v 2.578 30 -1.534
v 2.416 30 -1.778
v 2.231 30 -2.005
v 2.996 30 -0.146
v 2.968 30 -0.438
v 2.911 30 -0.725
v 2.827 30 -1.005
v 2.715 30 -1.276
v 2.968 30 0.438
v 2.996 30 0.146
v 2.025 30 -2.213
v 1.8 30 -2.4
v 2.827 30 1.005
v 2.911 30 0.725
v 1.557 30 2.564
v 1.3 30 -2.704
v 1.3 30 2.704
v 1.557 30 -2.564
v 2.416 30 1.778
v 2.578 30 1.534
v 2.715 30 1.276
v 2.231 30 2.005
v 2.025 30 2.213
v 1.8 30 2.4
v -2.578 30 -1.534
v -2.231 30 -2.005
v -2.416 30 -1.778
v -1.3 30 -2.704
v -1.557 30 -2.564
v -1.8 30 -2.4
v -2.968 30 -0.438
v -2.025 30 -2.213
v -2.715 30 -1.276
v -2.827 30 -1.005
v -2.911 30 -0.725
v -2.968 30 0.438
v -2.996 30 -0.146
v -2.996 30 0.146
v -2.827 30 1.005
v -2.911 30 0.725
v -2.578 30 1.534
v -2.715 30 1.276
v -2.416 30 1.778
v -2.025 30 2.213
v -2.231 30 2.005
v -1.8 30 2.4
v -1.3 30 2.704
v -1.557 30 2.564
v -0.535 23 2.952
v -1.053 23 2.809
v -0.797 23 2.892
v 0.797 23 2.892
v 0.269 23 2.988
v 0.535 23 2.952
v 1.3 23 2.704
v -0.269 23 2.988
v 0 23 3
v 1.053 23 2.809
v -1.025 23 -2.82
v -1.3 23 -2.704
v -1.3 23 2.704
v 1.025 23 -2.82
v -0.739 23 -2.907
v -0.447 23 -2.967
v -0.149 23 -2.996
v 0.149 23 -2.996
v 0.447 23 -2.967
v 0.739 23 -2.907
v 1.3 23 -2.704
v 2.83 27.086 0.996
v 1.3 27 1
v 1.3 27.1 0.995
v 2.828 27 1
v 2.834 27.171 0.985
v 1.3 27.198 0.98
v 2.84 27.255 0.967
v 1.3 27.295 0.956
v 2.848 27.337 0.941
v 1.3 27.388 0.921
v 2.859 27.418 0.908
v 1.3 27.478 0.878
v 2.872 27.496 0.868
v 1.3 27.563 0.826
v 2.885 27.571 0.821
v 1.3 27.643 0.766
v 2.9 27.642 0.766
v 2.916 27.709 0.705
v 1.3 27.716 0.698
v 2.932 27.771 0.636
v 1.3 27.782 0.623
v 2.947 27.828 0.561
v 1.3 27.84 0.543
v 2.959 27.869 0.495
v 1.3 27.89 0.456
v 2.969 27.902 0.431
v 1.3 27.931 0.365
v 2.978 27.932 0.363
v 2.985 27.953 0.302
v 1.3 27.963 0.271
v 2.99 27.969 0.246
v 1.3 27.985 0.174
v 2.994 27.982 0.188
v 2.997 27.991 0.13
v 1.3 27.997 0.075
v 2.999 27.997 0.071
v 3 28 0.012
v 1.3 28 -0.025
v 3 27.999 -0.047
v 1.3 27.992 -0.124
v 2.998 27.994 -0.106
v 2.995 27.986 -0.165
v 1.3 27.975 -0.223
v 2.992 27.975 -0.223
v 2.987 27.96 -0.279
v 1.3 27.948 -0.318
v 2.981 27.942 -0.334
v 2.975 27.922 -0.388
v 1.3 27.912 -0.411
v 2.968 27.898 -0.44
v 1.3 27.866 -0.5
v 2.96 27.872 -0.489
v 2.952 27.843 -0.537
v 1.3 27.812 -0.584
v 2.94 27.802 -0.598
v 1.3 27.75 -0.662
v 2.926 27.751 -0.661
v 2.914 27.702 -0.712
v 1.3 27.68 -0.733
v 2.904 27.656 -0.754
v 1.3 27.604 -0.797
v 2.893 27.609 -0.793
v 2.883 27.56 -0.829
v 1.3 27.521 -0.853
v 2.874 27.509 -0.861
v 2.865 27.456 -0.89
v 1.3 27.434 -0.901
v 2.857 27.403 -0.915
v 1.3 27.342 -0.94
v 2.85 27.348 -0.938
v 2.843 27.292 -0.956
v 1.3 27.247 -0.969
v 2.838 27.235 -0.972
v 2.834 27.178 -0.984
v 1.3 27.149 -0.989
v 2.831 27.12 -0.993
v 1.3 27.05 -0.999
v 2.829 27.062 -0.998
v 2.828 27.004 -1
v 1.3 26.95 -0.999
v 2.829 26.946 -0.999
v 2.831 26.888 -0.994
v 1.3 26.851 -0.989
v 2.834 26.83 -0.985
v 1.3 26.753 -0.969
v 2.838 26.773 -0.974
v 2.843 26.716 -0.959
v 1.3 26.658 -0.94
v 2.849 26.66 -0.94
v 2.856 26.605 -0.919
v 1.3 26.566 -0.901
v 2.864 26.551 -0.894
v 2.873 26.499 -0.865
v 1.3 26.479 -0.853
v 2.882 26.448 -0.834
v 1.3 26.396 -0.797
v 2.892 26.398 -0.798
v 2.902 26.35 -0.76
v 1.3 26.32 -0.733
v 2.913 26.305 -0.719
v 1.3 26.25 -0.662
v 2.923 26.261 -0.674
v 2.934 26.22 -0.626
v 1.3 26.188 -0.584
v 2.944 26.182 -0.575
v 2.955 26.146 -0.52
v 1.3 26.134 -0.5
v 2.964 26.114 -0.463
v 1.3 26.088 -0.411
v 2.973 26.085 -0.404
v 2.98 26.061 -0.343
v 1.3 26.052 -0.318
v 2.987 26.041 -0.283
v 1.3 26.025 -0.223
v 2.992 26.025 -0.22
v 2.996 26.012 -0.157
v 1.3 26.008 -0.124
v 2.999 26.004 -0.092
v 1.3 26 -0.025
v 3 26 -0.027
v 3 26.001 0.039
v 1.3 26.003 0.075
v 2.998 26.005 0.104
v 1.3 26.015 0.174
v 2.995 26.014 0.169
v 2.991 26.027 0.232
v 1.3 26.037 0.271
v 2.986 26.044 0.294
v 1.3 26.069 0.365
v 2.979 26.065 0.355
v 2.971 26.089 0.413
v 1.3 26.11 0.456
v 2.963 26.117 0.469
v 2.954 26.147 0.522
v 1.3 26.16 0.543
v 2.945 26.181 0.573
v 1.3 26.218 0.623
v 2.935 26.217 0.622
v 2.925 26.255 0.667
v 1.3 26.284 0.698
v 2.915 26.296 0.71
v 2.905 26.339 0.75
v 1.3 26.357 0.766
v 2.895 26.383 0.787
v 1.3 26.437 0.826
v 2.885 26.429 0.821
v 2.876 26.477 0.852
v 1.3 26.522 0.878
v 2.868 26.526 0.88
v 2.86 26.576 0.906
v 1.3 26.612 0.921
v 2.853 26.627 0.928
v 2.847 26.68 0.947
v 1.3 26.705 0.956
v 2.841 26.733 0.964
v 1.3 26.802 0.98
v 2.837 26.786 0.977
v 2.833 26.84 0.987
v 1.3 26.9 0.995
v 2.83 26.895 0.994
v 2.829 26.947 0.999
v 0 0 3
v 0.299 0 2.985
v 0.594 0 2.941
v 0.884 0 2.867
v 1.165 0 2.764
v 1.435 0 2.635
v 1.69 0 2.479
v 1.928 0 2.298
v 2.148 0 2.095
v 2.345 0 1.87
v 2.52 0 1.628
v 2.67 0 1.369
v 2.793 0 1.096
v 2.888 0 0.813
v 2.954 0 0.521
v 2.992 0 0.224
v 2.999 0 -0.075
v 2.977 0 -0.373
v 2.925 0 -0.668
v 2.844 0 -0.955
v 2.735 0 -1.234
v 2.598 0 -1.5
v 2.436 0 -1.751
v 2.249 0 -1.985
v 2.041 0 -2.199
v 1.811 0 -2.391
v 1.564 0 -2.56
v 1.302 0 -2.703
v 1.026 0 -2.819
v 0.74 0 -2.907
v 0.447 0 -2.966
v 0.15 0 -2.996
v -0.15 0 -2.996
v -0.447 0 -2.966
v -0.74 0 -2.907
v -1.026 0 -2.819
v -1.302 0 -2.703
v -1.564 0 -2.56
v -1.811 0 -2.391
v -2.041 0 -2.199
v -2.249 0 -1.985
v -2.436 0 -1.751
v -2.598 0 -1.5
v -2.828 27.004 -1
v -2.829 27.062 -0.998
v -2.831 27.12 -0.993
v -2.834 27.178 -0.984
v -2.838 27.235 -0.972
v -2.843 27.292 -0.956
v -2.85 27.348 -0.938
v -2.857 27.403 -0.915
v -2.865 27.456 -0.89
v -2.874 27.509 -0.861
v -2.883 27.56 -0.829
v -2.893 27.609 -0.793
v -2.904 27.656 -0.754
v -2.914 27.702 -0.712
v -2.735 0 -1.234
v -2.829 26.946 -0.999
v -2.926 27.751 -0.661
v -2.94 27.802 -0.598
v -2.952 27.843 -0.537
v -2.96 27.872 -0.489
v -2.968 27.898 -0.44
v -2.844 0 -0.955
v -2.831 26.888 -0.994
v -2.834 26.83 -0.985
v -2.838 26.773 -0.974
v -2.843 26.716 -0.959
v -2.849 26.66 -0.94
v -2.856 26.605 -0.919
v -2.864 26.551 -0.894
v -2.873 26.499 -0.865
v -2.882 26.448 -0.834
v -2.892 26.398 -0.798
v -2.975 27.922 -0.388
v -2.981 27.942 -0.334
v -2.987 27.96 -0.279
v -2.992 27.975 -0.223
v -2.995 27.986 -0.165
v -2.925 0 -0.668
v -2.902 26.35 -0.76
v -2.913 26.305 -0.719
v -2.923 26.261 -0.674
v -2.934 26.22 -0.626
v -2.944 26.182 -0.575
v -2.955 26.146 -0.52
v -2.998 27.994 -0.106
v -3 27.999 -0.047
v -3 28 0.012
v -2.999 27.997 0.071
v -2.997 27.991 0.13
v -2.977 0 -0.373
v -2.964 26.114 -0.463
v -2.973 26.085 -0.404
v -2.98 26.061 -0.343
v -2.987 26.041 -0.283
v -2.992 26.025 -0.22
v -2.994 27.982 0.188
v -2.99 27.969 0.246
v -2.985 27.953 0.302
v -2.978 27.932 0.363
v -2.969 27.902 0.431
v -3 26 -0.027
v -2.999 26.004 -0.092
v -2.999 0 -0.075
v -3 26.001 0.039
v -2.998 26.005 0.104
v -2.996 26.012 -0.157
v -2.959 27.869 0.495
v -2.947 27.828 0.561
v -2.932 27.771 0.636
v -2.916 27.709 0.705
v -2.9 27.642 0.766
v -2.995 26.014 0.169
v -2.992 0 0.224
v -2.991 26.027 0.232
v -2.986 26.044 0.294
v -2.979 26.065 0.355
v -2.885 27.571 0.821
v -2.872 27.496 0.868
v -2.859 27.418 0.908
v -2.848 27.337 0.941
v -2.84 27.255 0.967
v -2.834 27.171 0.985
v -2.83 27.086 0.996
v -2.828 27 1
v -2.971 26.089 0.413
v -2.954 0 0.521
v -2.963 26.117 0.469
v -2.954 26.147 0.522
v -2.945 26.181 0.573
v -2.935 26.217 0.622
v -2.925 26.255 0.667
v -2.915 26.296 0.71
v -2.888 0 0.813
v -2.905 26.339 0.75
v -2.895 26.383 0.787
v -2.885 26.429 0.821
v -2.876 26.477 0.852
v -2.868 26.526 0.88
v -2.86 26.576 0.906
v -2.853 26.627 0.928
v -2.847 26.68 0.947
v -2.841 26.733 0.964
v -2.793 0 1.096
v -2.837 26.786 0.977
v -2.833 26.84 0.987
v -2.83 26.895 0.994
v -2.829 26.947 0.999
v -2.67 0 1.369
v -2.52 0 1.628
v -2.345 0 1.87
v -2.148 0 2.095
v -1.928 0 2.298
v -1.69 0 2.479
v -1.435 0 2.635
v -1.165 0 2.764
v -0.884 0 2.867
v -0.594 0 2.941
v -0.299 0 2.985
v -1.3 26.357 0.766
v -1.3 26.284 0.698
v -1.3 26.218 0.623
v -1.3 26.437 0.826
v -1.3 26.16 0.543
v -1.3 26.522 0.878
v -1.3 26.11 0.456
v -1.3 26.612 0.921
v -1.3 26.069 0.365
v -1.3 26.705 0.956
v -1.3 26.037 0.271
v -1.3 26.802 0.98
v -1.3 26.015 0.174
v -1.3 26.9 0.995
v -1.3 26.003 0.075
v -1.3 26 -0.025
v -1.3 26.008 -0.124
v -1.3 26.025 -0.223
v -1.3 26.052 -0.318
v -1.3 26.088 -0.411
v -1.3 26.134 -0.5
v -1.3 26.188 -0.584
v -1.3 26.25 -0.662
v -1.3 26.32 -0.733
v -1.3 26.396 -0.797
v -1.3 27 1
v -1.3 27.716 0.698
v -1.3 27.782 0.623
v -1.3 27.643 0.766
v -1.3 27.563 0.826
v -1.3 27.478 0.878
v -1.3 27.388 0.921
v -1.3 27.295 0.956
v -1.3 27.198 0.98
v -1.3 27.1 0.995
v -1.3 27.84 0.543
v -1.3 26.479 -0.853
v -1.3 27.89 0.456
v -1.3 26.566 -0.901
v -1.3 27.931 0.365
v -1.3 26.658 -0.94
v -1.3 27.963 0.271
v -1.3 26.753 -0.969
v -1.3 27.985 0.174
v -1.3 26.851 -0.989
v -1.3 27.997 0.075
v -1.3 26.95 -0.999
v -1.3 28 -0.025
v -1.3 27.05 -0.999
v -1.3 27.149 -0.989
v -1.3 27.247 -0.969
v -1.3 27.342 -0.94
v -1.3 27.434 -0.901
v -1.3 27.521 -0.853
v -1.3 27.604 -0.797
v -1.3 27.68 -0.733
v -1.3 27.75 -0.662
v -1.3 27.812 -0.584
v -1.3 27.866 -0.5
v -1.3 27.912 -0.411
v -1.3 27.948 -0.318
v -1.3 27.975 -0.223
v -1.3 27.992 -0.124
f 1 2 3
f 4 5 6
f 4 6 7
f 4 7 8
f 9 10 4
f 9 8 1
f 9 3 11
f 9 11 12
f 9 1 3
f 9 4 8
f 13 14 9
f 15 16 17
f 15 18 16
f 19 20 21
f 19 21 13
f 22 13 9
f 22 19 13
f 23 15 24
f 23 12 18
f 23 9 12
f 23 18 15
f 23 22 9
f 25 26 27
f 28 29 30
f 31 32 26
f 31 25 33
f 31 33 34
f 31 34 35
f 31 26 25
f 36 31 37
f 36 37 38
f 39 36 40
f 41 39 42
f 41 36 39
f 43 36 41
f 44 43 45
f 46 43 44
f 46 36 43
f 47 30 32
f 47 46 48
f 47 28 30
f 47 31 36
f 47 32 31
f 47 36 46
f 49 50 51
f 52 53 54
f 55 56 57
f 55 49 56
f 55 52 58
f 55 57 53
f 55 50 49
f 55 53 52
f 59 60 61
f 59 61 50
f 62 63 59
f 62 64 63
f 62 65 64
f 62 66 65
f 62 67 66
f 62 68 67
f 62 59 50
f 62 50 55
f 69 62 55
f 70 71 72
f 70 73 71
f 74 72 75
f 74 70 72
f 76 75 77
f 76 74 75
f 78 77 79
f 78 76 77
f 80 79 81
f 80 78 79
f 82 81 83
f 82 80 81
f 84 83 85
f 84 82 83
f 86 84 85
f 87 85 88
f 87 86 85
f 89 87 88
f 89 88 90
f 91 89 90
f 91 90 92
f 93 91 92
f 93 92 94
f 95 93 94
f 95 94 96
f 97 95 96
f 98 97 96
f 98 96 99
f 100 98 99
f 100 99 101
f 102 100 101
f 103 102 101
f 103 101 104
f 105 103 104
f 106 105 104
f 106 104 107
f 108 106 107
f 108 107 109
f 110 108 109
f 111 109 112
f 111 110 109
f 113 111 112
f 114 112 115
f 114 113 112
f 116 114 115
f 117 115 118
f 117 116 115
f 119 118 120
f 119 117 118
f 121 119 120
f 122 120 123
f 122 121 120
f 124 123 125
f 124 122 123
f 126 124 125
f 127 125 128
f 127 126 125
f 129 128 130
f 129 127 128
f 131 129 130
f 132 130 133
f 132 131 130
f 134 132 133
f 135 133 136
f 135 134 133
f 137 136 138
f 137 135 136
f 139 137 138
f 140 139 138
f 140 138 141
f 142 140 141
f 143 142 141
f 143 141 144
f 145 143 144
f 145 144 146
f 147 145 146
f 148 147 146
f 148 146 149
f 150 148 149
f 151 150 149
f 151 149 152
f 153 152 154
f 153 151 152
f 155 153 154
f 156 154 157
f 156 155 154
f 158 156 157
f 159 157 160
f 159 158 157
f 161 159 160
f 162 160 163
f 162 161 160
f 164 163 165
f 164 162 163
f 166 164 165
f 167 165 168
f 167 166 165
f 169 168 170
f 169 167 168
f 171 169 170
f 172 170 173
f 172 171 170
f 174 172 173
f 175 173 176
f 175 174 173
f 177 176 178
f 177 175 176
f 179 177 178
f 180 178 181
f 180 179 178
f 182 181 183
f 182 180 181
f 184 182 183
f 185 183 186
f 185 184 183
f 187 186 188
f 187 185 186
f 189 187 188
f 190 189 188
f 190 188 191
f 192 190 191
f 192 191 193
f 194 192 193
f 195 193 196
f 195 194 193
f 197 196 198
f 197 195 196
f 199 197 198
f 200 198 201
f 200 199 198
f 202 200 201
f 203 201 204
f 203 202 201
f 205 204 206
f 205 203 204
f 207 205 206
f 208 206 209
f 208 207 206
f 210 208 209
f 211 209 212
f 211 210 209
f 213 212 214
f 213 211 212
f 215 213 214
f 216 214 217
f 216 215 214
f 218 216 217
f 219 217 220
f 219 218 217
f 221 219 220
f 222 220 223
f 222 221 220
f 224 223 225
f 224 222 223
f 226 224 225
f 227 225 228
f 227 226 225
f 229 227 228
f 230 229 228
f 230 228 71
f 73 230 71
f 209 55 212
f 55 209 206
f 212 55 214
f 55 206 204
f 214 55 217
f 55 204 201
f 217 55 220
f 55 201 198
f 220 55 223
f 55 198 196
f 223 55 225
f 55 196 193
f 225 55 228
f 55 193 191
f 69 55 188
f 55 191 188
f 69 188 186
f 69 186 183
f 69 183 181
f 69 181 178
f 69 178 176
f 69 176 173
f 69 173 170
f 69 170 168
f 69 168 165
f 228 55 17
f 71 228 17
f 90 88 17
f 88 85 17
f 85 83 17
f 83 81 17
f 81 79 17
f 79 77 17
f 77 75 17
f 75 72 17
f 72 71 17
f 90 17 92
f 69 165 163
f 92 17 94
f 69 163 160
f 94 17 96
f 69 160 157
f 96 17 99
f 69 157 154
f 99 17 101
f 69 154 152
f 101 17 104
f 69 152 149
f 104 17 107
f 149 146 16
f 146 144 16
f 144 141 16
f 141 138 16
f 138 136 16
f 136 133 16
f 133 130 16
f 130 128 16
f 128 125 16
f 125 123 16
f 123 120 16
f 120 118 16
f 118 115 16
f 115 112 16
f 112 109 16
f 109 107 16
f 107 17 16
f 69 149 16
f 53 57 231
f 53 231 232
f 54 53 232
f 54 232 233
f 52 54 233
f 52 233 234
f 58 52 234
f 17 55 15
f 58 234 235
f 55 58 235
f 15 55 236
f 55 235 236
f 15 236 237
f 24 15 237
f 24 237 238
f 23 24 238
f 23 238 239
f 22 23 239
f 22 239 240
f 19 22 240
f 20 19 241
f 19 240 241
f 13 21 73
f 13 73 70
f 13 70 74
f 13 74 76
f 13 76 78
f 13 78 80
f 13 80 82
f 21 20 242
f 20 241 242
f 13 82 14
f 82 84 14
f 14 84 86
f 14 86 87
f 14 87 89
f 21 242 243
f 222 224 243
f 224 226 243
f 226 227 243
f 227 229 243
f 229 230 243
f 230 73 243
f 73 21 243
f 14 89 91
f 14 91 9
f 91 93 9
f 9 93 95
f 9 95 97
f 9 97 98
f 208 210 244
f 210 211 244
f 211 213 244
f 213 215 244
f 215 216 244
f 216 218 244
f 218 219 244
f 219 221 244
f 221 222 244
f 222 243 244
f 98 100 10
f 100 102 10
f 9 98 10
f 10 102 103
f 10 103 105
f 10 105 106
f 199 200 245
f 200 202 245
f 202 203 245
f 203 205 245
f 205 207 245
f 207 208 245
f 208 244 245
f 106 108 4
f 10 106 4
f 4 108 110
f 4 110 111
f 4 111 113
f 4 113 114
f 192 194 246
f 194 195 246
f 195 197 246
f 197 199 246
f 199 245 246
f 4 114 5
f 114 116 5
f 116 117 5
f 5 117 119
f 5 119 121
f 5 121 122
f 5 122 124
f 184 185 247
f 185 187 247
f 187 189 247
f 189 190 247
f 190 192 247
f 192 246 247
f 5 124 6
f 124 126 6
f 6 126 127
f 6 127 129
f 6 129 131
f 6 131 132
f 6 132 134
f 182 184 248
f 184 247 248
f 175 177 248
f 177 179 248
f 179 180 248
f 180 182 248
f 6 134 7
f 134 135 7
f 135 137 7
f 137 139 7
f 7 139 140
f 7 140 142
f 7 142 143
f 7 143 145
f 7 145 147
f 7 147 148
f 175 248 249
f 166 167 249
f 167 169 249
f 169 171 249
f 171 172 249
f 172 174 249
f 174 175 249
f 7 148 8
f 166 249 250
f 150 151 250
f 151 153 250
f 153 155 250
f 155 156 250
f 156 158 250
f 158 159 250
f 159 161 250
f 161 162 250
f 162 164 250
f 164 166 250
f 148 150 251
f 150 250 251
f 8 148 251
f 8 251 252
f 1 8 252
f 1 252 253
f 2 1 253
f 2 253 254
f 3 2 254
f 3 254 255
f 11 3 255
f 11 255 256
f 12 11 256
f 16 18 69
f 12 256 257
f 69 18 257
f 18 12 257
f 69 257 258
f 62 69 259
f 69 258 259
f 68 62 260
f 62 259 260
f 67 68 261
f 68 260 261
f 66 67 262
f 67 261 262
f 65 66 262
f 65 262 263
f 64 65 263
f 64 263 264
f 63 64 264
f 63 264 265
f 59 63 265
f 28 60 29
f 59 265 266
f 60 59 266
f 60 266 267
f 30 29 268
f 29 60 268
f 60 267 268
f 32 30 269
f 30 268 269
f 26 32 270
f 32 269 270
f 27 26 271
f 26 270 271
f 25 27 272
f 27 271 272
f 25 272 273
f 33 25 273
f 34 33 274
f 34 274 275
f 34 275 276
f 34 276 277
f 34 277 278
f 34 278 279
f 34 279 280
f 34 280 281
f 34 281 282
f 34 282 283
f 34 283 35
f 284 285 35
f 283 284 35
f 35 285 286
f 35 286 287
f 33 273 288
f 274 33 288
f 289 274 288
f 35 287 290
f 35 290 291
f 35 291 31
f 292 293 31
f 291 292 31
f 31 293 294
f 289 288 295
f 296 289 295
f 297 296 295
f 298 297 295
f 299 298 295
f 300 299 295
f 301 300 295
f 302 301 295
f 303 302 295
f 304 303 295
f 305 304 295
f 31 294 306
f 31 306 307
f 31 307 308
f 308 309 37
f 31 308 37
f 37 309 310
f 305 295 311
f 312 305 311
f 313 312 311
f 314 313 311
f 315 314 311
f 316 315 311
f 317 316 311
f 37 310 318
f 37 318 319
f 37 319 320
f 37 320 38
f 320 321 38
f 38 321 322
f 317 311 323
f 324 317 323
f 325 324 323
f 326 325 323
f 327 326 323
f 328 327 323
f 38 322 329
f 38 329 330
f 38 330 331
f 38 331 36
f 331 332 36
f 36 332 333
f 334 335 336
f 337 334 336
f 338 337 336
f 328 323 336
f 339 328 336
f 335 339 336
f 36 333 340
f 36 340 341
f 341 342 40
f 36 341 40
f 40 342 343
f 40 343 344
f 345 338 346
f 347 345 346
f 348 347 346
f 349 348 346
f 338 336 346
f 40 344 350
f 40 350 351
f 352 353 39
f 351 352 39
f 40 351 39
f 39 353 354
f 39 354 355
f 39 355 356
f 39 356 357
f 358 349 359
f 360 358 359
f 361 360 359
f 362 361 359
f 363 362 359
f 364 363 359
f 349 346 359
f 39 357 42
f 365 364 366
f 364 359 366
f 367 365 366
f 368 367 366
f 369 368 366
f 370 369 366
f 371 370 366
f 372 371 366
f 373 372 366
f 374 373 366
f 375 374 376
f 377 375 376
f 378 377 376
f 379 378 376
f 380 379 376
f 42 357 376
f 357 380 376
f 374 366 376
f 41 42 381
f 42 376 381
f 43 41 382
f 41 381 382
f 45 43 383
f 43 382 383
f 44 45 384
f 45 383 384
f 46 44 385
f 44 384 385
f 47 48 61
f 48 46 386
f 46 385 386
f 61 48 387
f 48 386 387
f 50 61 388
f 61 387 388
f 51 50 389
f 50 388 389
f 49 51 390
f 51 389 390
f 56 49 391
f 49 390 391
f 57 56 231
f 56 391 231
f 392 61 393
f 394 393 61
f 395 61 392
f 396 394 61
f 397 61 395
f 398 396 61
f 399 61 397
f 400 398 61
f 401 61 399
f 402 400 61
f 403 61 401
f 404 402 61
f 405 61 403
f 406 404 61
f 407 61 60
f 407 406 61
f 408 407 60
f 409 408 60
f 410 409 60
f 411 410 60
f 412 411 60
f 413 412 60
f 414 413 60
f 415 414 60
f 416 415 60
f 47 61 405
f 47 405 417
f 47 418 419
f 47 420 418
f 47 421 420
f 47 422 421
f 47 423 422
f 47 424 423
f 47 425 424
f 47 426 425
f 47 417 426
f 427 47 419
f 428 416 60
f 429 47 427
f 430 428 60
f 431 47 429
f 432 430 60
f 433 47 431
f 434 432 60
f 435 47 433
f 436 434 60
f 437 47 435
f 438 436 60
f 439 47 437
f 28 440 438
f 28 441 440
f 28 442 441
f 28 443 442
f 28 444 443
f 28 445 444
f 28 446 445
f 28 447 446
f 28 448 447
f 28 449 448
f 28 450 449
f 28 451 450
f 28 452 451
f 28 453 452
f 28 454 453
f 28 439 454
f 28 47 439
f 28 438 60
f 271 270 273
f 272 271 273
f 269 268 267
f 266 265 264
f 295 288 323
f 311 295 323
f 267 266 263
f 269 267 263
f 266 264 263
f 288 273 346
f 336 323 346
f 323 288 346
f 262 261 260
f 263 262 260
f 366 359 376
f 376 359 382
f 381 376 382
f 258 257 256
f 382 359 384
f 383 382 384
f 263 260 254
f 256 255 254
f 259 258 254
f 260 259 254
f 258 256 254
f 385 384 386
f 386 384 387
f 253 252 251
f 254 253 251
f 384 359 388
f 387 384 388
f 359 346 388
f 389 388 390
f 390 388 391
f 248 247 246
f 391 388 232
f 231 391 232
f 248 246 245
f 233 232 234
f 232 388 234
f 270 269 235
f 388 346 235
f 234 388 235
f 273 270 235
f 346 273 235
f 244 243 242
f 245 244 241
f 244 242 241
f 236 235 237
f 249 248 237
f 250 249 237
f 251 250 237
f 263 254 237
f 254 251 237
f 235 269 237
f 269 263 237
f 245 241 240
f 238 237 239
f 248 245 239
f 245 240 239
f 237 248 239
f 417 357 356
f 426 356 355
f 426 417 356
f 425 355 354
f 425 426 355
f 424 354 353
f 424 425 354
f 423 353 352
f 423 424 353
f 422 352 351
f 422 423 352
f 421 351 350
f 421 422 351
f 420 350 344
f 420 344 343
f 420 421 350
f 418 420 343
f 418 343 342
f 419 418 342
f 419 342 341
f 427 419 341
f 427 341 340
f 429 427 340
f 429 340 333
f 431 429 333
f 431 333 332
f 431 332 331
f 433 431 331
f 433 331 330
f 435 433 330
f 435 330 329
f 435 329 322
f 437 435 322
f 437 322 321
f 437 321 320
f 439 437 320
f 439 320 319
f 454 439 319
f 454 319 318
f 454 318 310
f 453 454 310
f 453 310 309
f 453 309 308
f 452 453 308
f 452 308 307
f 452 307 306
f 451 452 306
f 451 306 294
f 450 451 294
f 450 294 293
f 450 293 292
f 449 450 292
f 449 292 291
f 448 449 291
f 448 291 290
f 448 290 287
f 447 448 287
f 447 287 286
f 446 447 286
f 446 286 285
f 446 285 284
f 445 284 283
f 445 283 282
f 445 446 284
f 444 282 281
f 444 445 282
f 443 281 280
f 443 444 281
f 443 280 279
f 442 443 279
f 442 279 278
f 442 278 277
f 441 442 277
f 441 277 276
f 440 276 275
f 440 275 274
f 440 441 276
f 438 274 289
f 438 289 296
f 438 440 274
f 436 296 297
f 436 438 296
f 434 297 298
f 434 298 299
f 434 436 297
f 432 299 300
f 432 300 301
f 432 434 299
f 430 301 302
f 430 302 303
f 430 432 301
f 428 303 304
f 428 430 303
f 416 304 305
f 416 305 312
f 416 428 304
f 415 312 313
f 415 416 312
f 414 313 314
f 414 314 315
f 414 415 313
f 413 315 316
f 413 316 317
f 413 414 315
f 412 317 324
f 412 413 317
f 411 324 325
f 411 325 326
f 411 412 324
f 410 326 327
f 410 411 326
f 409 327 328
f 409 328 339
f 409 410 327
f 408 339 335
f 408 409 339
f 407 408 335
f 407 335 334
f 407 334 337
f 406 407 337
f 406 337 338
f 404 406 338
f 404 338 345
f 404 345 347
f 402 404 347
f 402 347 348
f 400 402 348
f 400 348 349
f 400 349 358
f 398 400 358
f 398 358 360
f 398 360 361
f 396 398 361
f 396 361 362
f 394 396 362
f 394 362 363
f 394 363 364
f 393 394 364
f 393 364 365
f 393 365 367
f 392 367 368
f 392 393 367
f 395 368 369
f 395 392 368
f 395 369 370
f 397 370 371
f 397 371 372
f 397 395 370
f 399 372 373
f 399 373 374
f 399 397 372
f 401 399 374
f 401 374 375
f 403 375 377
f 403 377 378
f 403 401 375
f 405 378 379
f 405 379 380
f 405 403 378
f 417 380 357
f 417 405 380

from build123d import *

# Parameters (mm, degrees)
SKETCH_1_R               = 3
EXTRUDE_1_DEPTH          = 30
SKETCH_2_W               = 2.6
SKETCH_2_H               = 6.217658974
CUT_EXTRUDE_1_DEPTH      = 7
CUT_EXTRUDE_3_DEPTH      = 31.454720488
CUT_EXTRUDE_3_DEPTH_BACK = 31.454720488
SKETCH_3_R               = 1


with BuildPart() as part:
    # 草图1 → 凸台-拉伸1 (new body)
    with BuildSketch(Plane(origin=(0, 0, 0), x_dir=(1, 0, 0), z_dir=(0, 1, 0))):
        with Locations(Location((0, 0, 0), (0, 0, 270))):
            Circle(SKETCH_1_R)
    extrude(amount=EXTRUDE_1_DEPTH)

    # 草图2 → 切除-拉伸1 (cut)
    with BuildSketch(Plane(origin=(0, 30, 0), x_dir=(1, 0, 0), z_dir=(0, 1, 0))):
        Rectangle(SKETCH_2_W, SKETCH_2_H)
    extrude(amount=-CUT_EXTRUDE_1_DEPTH, mode=Mode.SUBTRACT)

    # 草图3 → 切除-拉伸3 (cut, two sides: drawn at the far end of the back side and taken through both)
    with BuildSketch(Plane.ZY.offset(-1.3).offset(-CUT_EXTRUDE_3_DEPTH_BACK)):
        with Locations((0, 27)):
            Circle(SKETCH_3_R)
    extrude(amount=CUT_EXTRUDE_3_DEPTH + CUT_EXTRUDE_3_DEPTH_BACK, mode=Mode.SUBTRACT)


solid = part.part
